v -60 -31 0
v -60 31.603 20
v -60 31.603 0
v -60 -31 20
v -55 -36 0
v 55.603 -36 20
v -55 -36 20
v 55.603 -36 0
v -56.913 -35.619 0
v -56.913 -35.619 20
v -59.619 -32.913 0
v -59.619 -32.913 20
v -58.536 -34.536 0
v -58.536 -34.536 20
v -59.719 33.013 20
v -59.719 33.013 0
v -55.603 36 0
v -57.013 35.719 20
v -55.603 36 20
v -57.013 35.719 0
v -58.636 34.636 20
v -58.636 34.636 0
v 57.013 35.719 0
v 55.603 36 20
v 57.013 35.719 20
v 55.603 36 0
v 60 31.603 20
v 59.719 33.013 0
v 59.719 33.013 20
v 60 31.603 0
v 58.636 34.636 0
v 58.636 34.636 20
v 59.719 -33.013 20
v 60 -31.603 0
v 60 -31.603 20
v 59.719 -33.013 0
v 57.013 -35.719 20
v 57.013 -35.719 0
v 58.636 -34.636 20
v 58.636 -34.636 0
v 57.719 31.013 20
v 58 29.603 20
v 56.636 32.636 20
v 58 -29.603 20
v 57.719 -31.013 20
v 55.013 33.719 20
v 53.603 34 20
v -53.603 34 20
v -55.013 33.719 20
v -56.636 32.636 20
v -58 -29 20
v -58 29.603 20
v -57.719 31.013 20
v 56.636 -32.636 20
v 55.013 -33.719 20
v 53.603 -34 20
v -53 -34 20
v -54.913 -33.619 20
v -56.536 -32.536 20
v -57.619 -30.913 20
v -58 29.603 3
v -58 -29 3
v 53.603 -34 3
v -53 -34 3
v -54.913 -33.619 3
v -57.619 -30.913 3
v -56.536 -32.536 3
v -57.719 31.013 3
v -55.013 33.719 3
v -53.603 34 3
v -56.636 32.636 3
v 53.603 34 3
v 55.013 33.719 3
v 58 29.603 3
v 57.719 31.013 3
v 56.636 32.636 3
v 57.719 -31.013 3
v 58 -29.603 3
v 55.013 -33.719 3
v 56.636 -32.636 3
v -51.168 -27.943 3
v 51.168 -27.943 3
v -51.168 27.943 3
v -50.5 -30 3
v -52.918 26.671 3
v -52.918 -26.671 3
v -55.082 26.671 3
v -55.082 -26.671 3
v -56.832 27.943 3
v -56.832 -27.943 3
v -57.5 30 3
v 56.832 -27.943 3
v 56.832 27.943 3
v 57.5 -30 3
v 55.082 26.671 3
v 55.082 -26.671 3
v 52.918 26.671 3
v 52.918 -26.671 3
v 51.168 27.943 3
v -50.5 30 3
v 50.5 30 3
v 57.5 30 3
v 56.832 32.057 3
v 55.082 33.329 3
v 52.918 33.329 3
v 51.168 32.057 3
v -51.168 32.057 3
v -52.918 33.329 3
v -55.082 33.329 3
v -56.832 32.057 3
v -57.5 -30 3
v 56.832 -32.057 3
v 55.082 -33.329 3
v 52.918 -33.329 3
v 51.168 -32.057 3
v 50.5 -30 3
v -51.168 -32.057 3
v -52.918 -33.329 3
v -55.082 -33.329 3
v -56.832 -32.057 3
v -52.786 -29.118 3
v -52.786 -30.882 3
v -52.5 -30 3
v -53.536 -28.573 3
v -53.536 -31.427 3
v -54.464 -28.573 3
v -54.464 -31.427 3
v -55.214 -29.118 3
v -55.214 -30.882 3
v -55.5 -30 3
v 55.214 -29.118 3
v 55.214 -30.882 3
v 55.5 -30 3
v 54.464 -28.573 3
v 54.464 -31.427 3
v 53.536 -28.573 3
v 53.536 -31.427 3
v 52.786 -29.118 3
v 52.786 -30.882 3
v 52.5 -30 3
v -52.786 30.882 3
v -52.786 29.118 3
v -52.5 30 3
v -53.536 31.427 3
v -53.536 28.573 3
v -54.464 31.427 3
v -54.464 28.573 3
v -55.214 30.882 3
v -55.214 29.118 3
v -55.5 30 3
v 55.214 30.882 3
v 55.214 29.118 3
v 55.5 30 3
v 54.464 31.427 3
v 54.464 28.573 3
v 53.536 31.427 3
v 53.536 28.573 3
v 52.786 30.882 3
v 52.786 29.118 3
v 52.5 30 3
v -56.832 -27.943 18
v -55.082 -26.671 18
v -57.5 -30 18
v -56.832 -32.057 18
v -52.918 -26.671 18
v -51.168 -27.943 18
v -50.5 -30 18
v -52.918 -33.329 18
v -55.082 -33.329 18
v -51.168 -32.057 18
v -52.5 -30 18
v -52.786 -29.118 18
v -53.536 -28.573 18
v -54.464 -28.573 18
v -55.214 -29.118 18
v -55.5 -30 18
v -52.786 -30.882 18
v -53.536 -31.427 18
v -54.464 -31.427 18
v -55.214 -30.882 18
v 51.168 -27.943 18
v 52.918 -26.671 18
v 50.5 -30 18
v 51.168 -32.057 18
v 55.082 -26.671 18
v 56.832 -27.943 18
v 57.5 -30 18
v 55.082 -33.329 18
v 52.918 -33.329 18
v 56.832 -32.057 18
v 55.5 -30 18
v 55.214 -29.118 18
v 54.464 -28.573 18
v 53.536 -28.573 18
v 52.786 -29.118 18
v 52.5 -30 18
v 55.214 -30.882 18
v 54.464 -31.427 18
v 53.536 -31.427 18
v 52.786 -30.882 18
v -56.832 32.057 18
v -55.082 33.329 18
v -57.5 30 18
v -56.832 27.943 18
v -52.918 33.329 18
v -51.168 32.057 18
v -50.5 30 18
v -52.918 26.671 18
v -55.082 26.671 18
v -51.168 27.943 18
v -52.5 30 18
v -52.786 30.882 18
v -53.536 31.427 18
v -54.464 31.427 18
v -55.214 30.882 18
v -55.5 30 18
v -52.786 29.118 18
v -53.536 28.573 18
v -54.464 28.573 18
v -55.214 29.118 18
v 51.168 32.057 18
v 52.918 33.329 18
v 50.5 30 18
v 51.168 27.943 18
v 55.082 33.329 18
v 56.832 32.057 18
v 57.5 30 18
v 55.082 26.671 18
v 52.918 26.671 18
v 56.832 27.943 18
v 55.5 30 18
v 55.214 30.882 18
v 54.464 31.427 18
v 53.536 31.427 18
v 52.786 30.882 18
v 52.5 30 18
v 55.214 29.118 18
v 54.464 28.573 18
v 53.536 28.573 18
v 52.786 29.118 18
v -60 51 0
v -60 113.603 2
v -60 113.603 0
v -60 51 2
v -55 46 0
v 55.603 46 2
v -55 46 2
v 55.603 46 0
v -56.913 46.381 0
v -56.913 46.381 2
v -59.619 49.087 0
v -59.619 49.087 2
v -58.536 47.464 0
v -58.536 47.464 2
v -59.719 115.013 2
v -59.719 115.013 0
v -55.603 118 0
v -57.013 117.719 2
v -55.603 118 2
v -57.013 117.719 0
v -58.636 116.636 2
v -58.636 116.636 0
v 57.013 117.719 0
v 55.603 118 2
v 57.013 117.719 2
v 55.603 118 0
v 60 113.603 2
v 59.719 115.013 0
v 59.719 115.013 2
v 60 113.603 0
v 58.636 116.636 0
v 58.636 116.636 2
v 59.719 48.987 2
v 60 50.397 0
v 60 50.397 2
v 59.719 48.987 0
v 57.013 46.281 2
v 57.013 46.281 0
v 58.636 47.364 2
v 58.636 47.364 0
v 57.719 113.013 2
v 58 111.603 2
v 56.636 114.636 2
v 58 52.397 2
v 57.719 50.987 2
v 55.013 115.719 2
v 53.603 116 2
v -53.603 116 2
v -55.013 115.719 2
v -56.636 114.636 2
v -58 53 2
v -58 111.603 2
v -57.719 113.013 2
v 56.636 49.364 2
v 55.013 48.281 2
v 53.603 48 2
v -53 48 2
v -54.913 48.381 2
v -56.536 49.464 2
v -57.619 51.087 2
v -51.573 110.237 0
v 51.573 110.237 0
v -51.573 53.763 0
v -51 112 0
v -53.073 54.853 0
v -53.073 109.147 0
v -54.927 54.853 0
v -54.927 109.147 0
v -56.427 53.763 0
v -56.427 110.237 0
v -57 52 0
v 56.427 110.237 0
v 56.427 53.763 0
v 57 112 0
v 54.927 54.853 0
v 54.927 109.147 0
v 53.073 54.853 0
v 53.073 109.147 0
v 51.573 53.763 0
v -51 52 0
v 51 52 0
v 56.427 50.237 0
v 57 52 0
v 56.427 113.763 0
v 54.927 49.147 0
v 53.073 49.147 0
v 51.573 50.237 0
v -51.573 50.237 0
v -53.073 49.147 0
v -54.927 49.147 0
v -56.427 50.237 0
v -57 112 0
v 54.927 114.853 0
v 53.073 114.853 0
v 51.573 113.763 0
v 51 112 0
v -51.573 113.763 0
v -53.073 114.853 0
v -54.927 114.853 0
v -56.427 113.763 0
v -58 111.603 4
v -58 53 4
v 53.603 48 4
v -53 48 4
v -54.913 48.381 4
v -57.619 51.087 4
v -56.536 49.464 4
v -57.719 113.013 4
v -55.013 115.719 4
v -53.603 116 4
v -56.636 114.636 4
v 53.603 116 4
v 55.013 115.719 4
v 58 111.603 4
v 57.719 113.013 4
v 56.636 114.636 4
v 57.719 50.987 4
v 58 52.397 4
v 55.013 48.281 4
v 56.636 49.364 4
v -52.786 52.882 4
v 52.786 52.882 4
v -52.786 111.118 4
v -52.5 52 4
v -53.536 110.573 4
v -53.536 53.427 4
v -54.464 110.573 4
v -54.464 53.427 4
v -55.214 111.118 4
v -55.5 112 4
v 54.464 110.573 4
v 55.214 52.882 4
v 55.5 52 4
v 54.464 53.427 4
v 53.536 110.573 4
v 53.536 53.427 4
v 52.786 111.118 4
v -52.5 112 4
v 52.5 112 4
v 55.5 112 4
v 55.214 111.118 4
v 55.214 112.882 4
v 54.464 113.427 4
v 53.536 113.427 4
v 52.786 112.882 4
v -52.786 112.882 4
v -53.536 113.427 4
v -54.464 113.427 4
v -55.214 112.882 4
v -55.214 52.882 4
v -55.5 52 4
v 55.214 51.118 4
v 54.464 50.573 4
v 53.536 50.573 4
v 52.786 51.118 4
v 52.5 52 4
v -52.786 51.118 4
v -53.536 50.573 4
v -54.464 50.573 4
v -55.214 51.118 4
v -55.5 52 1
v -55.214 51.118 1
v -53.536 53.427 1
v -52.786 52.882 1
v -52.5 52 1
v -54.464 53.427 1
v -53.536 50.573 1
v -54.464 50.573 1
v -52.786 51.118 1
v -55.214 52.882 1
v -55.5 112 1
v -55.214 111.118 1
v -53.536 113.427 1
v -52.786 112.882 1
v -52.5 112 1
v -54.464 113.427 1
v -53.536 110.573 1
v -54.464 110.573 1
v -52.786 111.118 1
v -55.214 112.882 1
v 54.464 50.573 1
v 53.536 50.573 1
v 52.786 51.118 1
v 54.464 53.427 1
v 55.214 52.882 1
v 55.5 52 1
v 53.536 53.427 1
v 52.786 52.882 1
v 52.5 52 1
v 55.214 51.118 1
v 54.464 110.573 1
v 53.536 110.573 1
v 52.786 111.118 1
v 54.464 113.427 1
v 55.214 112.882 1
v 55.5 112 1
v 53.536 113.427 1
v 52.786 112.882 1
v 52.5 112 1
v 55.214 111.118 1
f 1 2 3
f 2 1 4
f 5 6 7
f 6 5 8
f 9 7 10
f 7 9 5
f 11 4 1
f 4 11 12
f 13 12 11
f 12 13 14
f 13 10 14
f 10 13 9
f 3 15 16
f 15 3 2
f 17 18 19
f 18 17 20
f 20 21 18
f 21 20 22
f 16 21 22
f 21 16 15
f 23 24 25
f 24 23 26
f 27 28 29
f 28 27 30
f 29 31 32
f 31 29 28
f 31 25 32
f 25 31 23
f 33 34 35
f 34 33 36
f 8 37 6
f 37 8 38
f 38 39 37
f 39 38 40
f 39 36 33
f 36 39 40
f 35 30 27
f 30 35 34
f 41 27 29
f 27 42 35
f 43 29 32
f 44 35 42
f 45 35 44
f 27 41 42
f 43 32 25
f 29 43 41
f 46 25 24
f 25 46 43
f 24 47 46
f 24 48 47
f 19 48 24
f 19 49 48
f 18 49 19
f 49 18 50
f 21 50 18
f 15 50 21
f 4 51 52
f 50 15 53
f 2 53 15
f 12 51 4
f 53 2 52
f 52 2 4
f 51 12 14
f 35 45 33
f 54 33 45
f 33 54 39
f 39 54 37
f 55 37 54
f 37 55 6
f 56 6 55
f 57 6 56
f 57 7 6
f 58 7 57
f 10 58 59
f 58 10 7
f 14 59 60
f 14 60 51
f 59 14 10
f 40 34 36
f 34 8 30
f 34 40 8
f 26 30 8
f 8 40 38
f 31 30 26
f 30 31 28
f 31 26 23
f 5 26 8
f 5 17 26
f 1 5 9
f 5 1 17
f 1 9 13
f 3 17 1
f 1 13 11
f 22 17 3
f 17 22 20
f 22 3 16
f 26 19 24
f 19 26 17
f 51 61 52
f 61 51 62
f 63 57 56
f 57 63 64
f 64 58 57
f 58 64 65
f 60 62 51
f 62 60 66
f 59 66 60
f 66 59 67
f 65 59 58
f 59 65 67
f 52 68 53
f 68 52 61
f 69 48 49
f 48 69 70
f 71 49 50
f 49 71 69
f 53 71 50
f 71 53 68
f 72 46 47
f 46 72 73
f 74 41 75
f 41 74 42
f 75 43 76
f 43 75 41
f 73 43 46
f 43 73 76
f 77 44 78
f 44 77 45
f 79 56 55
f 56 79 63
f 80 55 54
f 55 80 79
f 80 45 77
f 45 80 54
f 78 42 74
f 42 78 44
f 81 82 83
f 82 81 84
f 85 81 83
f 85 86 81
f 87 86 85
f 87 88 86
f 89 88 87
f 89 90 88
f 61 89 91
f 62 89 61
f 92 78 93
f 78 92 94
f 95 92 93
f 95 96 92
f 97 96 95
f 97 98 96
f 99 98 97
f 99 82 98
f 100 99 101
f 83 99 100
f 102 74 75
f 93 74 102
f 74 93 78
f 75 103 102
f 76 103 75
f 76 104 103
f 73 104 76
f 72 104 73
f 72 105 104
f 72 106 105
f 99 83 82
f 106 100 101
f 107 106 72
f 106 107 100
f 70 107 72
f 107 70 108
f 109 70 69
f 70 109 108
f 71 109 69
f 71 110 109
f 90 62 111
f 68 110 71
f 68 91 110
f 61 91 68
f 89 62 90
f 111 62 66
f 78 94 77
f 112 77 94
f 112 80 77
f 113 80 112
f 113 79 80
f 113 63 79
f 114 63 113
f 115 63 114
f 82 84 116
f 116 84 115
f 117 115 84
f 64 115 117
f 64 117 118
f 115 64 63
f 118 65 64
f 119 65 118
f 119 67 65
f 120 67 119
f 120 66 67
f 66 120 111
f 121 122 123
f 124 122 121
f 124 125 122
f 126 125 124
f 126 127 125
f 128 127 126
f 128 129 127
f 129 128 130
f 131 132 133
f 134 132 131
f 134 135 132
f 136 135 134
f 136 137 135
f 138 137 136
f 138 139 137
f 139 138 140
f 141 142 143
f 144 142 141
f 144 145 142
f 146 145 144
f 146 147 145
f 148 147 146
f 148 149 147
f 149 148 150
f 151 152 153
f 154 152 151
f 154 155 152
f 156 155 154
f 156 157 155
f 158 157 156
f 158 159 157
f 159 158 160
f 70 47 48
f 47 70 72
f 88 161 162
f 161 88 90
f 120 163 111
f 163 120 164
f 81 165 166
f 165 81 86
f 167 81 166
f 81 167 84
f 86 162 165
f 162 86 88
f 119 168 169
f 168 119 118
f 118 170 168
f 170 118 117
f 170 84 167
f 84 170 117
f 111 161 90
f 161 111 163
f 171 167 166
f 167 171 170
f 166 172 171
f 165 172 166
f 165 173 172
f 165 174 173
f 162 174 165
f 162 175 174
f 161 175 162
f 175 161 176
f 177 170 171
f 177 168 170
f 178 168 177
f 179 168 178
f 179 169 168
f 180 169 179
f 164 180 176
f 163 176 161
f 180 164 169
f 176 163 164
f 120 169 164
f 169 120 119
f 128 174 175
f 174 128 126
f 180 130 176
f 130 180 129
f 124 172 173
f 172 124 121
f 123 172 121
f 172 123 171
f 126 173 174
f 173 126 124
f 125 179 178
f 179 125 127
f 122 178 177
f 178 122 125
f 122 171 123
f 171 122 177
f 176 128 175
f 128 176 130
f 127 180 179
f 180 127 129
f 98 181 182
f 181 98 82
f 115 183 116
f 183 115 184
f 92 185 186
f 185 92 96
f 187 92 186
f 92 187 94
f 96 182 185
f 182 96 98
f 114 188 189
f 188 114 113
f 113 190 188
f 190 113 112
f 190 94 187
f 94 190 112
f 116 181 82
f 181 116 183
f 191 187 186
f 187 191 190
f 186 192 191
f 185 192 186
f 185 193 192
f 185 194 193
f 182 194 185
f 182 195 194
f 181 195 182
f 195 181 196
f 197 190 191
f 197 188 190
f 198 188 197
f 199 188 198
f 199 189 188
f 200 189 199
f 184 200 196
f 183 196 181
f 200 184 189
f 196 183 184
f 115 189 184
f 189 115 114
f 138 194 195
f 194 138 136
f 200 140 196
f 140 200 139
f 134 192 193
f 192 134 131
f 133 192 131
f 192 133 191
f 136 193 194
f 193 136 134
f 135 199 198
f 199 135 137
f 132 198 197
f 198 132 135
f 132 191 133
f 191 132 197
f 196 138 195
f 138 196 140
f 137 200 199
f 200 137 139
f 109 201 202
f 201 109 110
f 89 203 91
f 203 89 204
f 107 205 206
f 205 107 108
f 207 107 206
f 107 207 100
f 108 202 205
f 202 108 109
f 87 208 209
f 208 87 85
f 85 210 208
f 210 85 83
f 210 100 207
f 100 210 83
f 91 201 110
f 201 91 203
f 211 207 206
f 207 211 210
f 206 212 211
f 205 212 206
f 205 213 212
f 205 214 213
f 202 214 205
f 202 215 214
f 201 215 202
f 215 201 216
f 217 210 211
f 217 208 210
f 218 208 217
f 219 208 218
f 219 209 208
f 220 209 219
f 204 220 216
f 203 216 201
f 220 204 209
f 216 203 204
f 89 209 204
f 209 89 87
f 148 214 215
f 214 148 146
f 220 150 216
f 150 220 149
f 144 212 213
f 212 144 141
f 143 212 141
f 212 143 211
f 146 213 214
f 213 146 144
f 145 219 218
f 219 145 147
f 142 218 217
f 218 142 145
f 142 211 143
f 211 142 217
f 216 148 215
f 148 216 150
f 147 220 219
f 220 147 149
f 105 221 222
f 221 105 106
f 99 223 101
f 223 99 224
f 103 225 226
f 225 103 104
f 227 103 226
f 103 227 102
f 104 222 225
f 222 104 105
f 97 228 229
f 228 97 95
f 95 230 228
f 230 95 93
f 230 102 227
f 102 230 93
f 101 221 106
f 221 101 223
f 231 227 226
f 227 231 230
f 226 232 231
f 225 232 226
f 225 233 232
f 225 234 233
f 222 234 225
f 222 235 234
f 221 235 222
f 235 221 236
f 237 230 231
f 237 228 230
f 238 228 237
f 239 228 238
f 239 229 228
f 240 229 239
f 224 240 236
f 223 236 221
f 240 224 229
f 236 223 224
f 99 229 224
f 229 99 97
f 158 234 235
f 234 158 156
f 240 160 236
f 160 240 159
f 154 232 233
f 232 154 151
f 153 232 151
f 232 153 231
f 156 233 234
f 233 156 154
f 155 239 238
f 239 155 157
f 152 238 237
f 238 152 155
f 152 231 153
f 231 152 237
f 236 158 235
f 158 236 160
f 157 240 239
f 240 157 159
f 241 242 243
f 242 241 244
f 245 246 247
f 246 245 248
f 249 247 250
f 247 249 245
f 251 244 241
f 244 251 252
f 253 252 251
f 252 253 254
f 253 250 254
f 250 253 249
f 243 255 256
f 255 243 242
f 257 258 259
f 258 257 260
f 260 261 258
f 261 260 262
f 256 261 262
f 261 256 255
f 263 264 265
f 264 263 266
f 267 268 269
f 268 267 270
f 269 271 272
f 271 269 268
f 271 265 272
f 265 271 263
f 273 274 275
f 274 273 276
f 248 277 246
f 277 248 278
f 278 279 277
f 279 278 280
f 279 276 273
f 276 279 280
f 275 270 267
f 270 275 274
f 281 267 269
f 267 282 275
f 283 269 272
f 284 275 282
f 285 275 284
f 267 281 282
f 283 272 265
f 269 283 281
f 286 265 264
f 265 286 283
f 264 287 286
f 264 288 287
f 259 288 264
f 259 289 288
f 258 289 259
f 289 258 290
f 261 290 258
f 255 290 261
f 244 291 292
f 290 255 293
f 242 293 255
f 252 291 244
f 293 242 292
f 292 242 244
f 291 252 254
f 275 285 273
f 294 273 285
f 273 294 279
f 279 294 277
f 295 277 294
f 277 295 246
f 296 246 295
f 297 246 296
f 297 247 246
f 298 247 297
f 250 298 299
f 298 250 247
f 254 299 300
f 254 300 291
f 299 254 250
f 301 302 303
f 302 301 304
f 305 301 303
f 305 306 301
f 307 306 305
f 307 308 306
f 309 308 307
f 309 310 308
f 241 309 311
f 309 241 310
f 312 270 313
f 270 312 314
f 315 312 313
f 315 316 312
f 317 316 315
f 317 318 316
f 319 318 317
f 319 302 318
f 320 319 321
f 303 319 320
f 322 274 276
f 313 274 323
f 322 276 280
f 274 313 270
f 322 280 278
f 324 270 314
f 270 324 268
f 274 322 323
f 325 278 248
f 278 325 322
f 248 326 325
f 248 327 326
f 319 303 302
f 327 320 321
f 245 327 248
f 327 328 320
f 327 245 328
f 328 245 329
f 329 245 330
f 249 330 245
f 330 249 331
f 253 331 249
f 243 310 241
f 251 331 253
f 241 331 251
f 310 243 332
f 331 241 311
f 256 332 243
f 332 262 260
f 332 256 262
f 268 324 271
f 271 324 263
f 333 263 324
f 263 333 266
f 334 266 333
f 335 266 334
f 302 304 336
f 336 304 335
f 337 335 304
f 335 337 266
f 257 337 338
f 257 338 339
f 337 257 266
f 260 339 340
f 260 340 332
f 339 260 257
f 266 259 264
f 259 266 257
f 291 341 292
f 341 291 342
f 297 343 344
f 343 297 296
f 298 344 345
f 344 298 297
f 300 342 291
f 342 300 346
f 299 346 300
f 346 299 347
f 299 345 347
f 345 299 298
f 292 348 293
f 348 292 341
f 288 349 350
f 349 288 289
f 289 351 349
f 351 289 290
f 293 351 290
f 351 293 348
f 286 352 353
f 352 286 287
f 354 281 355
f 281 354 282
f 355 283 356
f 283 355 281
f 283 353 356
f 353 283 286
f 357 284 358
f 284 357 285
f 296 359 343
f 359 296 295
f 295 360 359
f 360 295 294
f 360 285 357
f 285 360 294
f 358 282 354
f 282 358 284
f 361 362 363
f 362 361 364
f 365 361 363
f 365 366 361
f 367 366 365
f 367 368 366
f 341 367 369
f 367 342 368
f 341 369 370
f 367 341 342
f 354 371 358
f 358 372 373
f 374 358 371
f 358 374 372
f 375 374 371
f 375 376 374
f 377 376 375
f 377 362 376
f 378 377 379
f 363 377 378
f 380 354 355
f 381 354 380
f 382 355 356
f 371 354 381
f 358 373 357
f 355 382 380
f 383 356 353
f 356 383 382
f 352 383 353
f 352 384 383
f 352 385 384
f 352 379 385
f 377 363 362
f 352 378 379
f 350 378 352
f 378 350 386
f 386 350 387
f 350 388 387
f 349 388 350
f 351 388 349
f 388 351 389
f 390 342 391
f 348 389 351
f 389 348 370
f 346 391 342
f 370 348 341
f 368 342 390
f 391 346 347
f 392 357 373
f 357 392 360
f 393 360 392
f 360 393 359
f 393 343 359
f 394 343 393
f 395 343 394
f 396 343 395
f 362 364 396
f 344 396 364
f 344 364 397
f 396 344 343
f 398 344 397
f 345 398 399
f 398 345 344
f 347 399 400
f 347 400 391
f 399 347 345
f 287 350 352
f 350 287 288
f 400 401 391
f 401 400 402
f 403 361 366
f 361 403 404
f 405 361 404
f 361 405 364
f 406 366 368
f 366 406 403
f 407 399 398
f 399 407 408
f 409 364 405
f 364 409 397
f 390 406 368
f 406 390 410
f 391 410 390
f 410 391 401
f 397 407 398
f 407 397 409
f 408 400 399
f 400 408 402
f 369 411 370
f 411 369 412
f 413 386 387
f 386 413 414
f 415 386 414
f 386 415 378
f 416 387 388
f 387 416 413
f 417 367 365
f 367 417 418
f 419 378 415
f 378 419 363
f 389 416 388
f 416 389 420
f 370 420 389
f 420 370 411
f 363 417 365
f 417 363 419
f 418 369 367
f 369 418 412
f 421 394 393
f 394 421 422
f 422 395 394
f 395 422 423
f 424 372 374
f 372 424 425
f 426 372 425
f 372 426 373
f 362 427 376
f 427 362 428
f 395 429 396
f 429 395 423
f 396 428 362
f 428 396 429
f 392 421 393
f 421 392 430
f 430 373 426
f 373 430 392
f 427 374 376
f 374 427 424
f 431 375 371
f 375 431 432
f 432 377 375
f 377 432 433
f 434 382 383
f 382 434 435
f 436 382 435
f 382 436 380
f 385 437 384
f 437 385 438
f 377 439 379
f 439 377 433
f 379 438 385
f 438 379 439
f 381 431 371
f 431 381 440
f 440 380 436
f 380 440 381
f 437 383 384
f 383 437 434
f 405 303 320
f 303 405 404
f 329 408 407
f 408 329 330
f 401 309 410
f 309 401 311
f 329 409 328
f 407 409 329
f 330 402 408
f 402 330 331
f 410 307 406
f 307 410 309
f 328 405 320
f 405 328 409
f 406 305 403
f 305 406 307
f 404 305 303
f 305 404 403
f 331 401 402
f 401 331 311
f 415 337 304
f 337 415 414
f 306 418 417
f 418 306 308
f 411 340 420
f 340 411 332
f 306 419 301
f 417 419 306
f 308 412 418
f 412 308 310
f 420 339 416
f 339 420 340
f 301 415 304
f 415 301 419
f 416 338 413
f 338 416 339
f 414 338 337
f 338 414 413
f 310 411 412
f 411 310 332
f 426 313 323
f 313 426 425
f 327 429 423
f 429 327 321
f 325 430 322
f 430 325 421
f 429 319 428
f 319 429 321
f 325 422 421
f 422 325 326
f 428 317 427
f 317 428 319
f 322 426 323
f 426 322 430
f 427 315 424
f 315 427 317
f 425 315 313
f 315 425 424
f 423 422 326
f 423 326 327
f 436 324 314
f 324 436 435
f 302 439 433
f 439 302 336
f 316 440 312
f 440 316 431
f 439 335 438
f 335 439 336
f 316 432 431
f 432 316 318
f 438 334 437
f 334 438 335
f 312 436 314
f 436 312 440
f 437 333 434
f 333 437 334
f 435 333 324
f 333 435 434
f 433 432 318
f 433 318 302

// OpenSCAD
//
// Customized Enclosure
//

/*[Dimensions]*/

// Width of the enclosure
width = 120.0;
// Height of the enclosure
height = 72.0;
// Depth of the enclosure
depth = 20.0;
// Thickness of the walls and lid
thickness = 2;
// Amount of corner rounding
fillet_radius = 5.0;

/*[Hidden]*/

// Position offset from the corner for the stand-offs
standoff_offset = 0.5;
// Radius of the stand-offs
standoff_radius = 3.5;
// Radius of the hole in the stand-offs
standoff_hole_radius = 1.5;

// 
// builds a solid rectangle with rounded corners (Z-only)
//
module block(width, height, depth, fillet_radius) {
    
    difference() {
        cube([width, height, depth], center = true);
        
        fudge = 0.1;
        fudge_depth = depth + 1.0;
        
        translate([-(width / 2), -(height / 2), -(fudge_depth / 2)])
        intersection () {
            cube([fillet_radius, fillet_radius, fudge_depth], center = false); 
            difference() {
                    cube([2 * fillet_radius, 2 * fillet_radius, fudge_depth], center = false); 
                    translate([fillet_radius, fillet_radius, 0.0])
                    cylinder(r = fillet_radius, h = fudge_depth);
            }
        }

        translate([-(width / 2 + fudge), (height / 2 + fudge), -(fudge_depth / 2)])
        rotate([0.0, 0.0, -90])
        intersection () {
            cube([fillet_radius, fillet_radius, fudge_depth], center = false); 
            difference() {
                    cube([2 * fillet_radius, 2 * fillet_radius, fudge_depth], center = false); 
                    translate([fillet_radius, fillet_radius, 0.0])
                    cylinder(r = fillet_radius, h = fudge_depth);
            }
        }

        translate([(width / 2 + fudge), (height / 2 + fudge), -(fudge_depth / 2)])
        rotate([0.0, 0.0, 180])
        intersection () {
            cube([fillet_radius, fillet_radius, fudge_depth], center = false); 
            difference() {
                    cube([2 * fillet_radius, 2 * fillet_radius, fudge_depth], center = false); 
                    translate([fillet_radius, fillet_radius, 0.0])
                    cylinder(r = fillet_radius, h = fudge_depth);
            }
        }

        translate([(width / 2 + fudge), -(height / 2 + fudge), -(fudge_depth / 2)])
        rotate([0.0, 0.0, 90])
        intersection () {
            cube([fillet_radius, fillet_radius, fudge_depth], center = false); 
            difference() {
                    cube([2 * fillet_radius, 2 * fillet_radius, fudge_depth], center = false); 
                    translate([fillet_radius, fillet_radius, 0.0])
                    cylinder(r = fillet_radius, h = fudge_depth);
            }
        }
    }
}

module enclosure(width, height, depth, fillet_radius, thickness, standoff_offset, standoff_radius, standoff_hole_radius) {
    union() {
    
        translate([0.0, 0.0, depth / 2.0])
        difference() {
            block(width, height, depth, fillet_radius);
            translate([0.0, 0.0, thickness]) 
                block(width - (2 * thickness), height - (2 * thickness), depth - thickness, fillet_radius);
        }
        
        translate([-((width / 2) - (thickness + standoff_radius + standoff_offset)), -((height / 2) - (thickness + standoff_radius + standoff_offset)), thickness ])
        difference() {
            cylinder(r = standoff_radius, h = (depth - (2 * thickness)), $fn=10);
            cylinder(r = standoff_hole_radius, h = (depth - (2 * thickness)), $fn=10);
        }
    
        translate([((width / 2) - (thickness + standoff_radius + standoff_offset)), -((height / 2) - (thickness + standoff_radius + standoff_offset)), thickness ])
        difference() {
            cylinder(r = standoff_radius, h = (depth - (2 * thickness)), $fn=10);
            cylinder(r = standoff_hole_radius, h = (depth - (2 * thickness)), $fn=10);
        }

        translate([-((width / 2) - (thickness + standoff_radius + standoff_offset)), ((height / 2) - (thickness + standoff_radius + standoff_offset)), thickness ])
        difference() {
            cylinder(r = standoff_radius, h = (depth - (2 * thickness)), $fn=10);
            cylinder(r = standoff_hole_radius, h = (depth - (2 * thickness)), $fn=10);
        }

        translate([((width / 2) - (thickness + standoff_radius + standoff_offset)), ((height / 2) - (thickness + standoff_radius + standoff_offset)), thickness ])
        difference() {
            cylinder(r = standoff_radius, h = (depth - (2 * thickness)), $fn=10);
            cylinder(r = standoff_hole_radius, h = (depth - (2 * thickness)), $fn=10);
        }
        
    }
}

module lid(width, height, fillet_radius, thickness, standoff_offset, standoff_radius, standoff_hole_radius) {
    difference() {
    
        lid_offset = 10.0;
        
        union() {
            translate([0.0, height + lid_offset, thickness / 2.0])
                block(width, height, thickness, fillet_radius);
            translate([0.0, height + lid_offset, thickness / 2.0 + thickness])
                block(width - (2 * thickness), height - (2 * thickness), thickness, fillet_radius);
        }
        
        hole_offset = height + lid_offset;
        
        // holes 
        translate([-((width / 2) - (thickness + standoff_radius + standoff_offset)), -((height / 2) - (thickness + standoff_radius + standoff_offset)) + hole_offset, 0.0])
        cylinder(r = standoff_hole_radius, h = (2 * thickness), $fn=10);
        
        translate([-((width / 2) - (thickness + standoff_radius + standoff_offset)), ((height / 2) - (thickness + standoff_radius + standoff_offset)) + hole_offset, 0.0])
        cylinder(r = standoff_hole_radius, h = (2 * thickness), $fn=10);

        translate([((width / 2) - (thickness + standoff_radius + standoff_offset)), -((height / 2) - (thickness + standoff_radius + standoff_offset)) + hole_offset, 0.0])
        cylinder(r = standoff_hole_radius, h = (2 * thickness), $fn=10);

        translate([((width / 2) - (thickness + standoff_radius + standoff_offset)), ((height / 2) - (thickness + standoff_radius + standoff_offset)) + hole_offset, 0.0])
        cylinder(r = standoff_hole_radius, h = (2 * thickness), $fn=10);
        
        // countersinks
        translate([-((width / 2) - (thickness + standoff_radius + standoff_offset)), -((height / 2) - (thickness + standoff_radius + standoff_offset)) + hole_offset, 0.0])
        cylinder(r1 = standoff_hole_radius * 2, r2 = 0.0, h = thickness, $fn=10);
        
        translate([-((width / 2) - (thickness + standoff_radius + standoff_offset)), ((height / 2) - (thickness + standoff_radius + standoff_offset)) + hole_offset, 0.0])
        cylinder(r1 = standoff_hole_radius * 2, r2 = 0.0, h = thickness, $fn=10);

        translate([((width / 2) - (thickness + standoff_radius + standoff_offset)), -((height / 2) - (thickness + standoff_radius + standoff_offset)) + hole_offset, 0.0])
        cylinder(r1 = standoff_hole_radius * 2, r2 = 0.0, h = thickness, $fn=10);

        translate([((width / 2) - (thickness + standoff_radius + standoff_offset)), ((height / 2) - (thickness + standoff_radius + standoff_offset)) + hole_offset, 0.0])
        cylinder(r1 = standoff_hole_radius * 2, r2 = 0.0, h = thickness, $fn=10);
                
    }
}

enclosure(width, height, depth, fillet_radius, thickness, standoff_offset, standoff_radius, standoff_hole_radius);
lid(width, height, fillet_radius, thickness, standoff_offset, standoff_radius, standoff_hole_radius);
